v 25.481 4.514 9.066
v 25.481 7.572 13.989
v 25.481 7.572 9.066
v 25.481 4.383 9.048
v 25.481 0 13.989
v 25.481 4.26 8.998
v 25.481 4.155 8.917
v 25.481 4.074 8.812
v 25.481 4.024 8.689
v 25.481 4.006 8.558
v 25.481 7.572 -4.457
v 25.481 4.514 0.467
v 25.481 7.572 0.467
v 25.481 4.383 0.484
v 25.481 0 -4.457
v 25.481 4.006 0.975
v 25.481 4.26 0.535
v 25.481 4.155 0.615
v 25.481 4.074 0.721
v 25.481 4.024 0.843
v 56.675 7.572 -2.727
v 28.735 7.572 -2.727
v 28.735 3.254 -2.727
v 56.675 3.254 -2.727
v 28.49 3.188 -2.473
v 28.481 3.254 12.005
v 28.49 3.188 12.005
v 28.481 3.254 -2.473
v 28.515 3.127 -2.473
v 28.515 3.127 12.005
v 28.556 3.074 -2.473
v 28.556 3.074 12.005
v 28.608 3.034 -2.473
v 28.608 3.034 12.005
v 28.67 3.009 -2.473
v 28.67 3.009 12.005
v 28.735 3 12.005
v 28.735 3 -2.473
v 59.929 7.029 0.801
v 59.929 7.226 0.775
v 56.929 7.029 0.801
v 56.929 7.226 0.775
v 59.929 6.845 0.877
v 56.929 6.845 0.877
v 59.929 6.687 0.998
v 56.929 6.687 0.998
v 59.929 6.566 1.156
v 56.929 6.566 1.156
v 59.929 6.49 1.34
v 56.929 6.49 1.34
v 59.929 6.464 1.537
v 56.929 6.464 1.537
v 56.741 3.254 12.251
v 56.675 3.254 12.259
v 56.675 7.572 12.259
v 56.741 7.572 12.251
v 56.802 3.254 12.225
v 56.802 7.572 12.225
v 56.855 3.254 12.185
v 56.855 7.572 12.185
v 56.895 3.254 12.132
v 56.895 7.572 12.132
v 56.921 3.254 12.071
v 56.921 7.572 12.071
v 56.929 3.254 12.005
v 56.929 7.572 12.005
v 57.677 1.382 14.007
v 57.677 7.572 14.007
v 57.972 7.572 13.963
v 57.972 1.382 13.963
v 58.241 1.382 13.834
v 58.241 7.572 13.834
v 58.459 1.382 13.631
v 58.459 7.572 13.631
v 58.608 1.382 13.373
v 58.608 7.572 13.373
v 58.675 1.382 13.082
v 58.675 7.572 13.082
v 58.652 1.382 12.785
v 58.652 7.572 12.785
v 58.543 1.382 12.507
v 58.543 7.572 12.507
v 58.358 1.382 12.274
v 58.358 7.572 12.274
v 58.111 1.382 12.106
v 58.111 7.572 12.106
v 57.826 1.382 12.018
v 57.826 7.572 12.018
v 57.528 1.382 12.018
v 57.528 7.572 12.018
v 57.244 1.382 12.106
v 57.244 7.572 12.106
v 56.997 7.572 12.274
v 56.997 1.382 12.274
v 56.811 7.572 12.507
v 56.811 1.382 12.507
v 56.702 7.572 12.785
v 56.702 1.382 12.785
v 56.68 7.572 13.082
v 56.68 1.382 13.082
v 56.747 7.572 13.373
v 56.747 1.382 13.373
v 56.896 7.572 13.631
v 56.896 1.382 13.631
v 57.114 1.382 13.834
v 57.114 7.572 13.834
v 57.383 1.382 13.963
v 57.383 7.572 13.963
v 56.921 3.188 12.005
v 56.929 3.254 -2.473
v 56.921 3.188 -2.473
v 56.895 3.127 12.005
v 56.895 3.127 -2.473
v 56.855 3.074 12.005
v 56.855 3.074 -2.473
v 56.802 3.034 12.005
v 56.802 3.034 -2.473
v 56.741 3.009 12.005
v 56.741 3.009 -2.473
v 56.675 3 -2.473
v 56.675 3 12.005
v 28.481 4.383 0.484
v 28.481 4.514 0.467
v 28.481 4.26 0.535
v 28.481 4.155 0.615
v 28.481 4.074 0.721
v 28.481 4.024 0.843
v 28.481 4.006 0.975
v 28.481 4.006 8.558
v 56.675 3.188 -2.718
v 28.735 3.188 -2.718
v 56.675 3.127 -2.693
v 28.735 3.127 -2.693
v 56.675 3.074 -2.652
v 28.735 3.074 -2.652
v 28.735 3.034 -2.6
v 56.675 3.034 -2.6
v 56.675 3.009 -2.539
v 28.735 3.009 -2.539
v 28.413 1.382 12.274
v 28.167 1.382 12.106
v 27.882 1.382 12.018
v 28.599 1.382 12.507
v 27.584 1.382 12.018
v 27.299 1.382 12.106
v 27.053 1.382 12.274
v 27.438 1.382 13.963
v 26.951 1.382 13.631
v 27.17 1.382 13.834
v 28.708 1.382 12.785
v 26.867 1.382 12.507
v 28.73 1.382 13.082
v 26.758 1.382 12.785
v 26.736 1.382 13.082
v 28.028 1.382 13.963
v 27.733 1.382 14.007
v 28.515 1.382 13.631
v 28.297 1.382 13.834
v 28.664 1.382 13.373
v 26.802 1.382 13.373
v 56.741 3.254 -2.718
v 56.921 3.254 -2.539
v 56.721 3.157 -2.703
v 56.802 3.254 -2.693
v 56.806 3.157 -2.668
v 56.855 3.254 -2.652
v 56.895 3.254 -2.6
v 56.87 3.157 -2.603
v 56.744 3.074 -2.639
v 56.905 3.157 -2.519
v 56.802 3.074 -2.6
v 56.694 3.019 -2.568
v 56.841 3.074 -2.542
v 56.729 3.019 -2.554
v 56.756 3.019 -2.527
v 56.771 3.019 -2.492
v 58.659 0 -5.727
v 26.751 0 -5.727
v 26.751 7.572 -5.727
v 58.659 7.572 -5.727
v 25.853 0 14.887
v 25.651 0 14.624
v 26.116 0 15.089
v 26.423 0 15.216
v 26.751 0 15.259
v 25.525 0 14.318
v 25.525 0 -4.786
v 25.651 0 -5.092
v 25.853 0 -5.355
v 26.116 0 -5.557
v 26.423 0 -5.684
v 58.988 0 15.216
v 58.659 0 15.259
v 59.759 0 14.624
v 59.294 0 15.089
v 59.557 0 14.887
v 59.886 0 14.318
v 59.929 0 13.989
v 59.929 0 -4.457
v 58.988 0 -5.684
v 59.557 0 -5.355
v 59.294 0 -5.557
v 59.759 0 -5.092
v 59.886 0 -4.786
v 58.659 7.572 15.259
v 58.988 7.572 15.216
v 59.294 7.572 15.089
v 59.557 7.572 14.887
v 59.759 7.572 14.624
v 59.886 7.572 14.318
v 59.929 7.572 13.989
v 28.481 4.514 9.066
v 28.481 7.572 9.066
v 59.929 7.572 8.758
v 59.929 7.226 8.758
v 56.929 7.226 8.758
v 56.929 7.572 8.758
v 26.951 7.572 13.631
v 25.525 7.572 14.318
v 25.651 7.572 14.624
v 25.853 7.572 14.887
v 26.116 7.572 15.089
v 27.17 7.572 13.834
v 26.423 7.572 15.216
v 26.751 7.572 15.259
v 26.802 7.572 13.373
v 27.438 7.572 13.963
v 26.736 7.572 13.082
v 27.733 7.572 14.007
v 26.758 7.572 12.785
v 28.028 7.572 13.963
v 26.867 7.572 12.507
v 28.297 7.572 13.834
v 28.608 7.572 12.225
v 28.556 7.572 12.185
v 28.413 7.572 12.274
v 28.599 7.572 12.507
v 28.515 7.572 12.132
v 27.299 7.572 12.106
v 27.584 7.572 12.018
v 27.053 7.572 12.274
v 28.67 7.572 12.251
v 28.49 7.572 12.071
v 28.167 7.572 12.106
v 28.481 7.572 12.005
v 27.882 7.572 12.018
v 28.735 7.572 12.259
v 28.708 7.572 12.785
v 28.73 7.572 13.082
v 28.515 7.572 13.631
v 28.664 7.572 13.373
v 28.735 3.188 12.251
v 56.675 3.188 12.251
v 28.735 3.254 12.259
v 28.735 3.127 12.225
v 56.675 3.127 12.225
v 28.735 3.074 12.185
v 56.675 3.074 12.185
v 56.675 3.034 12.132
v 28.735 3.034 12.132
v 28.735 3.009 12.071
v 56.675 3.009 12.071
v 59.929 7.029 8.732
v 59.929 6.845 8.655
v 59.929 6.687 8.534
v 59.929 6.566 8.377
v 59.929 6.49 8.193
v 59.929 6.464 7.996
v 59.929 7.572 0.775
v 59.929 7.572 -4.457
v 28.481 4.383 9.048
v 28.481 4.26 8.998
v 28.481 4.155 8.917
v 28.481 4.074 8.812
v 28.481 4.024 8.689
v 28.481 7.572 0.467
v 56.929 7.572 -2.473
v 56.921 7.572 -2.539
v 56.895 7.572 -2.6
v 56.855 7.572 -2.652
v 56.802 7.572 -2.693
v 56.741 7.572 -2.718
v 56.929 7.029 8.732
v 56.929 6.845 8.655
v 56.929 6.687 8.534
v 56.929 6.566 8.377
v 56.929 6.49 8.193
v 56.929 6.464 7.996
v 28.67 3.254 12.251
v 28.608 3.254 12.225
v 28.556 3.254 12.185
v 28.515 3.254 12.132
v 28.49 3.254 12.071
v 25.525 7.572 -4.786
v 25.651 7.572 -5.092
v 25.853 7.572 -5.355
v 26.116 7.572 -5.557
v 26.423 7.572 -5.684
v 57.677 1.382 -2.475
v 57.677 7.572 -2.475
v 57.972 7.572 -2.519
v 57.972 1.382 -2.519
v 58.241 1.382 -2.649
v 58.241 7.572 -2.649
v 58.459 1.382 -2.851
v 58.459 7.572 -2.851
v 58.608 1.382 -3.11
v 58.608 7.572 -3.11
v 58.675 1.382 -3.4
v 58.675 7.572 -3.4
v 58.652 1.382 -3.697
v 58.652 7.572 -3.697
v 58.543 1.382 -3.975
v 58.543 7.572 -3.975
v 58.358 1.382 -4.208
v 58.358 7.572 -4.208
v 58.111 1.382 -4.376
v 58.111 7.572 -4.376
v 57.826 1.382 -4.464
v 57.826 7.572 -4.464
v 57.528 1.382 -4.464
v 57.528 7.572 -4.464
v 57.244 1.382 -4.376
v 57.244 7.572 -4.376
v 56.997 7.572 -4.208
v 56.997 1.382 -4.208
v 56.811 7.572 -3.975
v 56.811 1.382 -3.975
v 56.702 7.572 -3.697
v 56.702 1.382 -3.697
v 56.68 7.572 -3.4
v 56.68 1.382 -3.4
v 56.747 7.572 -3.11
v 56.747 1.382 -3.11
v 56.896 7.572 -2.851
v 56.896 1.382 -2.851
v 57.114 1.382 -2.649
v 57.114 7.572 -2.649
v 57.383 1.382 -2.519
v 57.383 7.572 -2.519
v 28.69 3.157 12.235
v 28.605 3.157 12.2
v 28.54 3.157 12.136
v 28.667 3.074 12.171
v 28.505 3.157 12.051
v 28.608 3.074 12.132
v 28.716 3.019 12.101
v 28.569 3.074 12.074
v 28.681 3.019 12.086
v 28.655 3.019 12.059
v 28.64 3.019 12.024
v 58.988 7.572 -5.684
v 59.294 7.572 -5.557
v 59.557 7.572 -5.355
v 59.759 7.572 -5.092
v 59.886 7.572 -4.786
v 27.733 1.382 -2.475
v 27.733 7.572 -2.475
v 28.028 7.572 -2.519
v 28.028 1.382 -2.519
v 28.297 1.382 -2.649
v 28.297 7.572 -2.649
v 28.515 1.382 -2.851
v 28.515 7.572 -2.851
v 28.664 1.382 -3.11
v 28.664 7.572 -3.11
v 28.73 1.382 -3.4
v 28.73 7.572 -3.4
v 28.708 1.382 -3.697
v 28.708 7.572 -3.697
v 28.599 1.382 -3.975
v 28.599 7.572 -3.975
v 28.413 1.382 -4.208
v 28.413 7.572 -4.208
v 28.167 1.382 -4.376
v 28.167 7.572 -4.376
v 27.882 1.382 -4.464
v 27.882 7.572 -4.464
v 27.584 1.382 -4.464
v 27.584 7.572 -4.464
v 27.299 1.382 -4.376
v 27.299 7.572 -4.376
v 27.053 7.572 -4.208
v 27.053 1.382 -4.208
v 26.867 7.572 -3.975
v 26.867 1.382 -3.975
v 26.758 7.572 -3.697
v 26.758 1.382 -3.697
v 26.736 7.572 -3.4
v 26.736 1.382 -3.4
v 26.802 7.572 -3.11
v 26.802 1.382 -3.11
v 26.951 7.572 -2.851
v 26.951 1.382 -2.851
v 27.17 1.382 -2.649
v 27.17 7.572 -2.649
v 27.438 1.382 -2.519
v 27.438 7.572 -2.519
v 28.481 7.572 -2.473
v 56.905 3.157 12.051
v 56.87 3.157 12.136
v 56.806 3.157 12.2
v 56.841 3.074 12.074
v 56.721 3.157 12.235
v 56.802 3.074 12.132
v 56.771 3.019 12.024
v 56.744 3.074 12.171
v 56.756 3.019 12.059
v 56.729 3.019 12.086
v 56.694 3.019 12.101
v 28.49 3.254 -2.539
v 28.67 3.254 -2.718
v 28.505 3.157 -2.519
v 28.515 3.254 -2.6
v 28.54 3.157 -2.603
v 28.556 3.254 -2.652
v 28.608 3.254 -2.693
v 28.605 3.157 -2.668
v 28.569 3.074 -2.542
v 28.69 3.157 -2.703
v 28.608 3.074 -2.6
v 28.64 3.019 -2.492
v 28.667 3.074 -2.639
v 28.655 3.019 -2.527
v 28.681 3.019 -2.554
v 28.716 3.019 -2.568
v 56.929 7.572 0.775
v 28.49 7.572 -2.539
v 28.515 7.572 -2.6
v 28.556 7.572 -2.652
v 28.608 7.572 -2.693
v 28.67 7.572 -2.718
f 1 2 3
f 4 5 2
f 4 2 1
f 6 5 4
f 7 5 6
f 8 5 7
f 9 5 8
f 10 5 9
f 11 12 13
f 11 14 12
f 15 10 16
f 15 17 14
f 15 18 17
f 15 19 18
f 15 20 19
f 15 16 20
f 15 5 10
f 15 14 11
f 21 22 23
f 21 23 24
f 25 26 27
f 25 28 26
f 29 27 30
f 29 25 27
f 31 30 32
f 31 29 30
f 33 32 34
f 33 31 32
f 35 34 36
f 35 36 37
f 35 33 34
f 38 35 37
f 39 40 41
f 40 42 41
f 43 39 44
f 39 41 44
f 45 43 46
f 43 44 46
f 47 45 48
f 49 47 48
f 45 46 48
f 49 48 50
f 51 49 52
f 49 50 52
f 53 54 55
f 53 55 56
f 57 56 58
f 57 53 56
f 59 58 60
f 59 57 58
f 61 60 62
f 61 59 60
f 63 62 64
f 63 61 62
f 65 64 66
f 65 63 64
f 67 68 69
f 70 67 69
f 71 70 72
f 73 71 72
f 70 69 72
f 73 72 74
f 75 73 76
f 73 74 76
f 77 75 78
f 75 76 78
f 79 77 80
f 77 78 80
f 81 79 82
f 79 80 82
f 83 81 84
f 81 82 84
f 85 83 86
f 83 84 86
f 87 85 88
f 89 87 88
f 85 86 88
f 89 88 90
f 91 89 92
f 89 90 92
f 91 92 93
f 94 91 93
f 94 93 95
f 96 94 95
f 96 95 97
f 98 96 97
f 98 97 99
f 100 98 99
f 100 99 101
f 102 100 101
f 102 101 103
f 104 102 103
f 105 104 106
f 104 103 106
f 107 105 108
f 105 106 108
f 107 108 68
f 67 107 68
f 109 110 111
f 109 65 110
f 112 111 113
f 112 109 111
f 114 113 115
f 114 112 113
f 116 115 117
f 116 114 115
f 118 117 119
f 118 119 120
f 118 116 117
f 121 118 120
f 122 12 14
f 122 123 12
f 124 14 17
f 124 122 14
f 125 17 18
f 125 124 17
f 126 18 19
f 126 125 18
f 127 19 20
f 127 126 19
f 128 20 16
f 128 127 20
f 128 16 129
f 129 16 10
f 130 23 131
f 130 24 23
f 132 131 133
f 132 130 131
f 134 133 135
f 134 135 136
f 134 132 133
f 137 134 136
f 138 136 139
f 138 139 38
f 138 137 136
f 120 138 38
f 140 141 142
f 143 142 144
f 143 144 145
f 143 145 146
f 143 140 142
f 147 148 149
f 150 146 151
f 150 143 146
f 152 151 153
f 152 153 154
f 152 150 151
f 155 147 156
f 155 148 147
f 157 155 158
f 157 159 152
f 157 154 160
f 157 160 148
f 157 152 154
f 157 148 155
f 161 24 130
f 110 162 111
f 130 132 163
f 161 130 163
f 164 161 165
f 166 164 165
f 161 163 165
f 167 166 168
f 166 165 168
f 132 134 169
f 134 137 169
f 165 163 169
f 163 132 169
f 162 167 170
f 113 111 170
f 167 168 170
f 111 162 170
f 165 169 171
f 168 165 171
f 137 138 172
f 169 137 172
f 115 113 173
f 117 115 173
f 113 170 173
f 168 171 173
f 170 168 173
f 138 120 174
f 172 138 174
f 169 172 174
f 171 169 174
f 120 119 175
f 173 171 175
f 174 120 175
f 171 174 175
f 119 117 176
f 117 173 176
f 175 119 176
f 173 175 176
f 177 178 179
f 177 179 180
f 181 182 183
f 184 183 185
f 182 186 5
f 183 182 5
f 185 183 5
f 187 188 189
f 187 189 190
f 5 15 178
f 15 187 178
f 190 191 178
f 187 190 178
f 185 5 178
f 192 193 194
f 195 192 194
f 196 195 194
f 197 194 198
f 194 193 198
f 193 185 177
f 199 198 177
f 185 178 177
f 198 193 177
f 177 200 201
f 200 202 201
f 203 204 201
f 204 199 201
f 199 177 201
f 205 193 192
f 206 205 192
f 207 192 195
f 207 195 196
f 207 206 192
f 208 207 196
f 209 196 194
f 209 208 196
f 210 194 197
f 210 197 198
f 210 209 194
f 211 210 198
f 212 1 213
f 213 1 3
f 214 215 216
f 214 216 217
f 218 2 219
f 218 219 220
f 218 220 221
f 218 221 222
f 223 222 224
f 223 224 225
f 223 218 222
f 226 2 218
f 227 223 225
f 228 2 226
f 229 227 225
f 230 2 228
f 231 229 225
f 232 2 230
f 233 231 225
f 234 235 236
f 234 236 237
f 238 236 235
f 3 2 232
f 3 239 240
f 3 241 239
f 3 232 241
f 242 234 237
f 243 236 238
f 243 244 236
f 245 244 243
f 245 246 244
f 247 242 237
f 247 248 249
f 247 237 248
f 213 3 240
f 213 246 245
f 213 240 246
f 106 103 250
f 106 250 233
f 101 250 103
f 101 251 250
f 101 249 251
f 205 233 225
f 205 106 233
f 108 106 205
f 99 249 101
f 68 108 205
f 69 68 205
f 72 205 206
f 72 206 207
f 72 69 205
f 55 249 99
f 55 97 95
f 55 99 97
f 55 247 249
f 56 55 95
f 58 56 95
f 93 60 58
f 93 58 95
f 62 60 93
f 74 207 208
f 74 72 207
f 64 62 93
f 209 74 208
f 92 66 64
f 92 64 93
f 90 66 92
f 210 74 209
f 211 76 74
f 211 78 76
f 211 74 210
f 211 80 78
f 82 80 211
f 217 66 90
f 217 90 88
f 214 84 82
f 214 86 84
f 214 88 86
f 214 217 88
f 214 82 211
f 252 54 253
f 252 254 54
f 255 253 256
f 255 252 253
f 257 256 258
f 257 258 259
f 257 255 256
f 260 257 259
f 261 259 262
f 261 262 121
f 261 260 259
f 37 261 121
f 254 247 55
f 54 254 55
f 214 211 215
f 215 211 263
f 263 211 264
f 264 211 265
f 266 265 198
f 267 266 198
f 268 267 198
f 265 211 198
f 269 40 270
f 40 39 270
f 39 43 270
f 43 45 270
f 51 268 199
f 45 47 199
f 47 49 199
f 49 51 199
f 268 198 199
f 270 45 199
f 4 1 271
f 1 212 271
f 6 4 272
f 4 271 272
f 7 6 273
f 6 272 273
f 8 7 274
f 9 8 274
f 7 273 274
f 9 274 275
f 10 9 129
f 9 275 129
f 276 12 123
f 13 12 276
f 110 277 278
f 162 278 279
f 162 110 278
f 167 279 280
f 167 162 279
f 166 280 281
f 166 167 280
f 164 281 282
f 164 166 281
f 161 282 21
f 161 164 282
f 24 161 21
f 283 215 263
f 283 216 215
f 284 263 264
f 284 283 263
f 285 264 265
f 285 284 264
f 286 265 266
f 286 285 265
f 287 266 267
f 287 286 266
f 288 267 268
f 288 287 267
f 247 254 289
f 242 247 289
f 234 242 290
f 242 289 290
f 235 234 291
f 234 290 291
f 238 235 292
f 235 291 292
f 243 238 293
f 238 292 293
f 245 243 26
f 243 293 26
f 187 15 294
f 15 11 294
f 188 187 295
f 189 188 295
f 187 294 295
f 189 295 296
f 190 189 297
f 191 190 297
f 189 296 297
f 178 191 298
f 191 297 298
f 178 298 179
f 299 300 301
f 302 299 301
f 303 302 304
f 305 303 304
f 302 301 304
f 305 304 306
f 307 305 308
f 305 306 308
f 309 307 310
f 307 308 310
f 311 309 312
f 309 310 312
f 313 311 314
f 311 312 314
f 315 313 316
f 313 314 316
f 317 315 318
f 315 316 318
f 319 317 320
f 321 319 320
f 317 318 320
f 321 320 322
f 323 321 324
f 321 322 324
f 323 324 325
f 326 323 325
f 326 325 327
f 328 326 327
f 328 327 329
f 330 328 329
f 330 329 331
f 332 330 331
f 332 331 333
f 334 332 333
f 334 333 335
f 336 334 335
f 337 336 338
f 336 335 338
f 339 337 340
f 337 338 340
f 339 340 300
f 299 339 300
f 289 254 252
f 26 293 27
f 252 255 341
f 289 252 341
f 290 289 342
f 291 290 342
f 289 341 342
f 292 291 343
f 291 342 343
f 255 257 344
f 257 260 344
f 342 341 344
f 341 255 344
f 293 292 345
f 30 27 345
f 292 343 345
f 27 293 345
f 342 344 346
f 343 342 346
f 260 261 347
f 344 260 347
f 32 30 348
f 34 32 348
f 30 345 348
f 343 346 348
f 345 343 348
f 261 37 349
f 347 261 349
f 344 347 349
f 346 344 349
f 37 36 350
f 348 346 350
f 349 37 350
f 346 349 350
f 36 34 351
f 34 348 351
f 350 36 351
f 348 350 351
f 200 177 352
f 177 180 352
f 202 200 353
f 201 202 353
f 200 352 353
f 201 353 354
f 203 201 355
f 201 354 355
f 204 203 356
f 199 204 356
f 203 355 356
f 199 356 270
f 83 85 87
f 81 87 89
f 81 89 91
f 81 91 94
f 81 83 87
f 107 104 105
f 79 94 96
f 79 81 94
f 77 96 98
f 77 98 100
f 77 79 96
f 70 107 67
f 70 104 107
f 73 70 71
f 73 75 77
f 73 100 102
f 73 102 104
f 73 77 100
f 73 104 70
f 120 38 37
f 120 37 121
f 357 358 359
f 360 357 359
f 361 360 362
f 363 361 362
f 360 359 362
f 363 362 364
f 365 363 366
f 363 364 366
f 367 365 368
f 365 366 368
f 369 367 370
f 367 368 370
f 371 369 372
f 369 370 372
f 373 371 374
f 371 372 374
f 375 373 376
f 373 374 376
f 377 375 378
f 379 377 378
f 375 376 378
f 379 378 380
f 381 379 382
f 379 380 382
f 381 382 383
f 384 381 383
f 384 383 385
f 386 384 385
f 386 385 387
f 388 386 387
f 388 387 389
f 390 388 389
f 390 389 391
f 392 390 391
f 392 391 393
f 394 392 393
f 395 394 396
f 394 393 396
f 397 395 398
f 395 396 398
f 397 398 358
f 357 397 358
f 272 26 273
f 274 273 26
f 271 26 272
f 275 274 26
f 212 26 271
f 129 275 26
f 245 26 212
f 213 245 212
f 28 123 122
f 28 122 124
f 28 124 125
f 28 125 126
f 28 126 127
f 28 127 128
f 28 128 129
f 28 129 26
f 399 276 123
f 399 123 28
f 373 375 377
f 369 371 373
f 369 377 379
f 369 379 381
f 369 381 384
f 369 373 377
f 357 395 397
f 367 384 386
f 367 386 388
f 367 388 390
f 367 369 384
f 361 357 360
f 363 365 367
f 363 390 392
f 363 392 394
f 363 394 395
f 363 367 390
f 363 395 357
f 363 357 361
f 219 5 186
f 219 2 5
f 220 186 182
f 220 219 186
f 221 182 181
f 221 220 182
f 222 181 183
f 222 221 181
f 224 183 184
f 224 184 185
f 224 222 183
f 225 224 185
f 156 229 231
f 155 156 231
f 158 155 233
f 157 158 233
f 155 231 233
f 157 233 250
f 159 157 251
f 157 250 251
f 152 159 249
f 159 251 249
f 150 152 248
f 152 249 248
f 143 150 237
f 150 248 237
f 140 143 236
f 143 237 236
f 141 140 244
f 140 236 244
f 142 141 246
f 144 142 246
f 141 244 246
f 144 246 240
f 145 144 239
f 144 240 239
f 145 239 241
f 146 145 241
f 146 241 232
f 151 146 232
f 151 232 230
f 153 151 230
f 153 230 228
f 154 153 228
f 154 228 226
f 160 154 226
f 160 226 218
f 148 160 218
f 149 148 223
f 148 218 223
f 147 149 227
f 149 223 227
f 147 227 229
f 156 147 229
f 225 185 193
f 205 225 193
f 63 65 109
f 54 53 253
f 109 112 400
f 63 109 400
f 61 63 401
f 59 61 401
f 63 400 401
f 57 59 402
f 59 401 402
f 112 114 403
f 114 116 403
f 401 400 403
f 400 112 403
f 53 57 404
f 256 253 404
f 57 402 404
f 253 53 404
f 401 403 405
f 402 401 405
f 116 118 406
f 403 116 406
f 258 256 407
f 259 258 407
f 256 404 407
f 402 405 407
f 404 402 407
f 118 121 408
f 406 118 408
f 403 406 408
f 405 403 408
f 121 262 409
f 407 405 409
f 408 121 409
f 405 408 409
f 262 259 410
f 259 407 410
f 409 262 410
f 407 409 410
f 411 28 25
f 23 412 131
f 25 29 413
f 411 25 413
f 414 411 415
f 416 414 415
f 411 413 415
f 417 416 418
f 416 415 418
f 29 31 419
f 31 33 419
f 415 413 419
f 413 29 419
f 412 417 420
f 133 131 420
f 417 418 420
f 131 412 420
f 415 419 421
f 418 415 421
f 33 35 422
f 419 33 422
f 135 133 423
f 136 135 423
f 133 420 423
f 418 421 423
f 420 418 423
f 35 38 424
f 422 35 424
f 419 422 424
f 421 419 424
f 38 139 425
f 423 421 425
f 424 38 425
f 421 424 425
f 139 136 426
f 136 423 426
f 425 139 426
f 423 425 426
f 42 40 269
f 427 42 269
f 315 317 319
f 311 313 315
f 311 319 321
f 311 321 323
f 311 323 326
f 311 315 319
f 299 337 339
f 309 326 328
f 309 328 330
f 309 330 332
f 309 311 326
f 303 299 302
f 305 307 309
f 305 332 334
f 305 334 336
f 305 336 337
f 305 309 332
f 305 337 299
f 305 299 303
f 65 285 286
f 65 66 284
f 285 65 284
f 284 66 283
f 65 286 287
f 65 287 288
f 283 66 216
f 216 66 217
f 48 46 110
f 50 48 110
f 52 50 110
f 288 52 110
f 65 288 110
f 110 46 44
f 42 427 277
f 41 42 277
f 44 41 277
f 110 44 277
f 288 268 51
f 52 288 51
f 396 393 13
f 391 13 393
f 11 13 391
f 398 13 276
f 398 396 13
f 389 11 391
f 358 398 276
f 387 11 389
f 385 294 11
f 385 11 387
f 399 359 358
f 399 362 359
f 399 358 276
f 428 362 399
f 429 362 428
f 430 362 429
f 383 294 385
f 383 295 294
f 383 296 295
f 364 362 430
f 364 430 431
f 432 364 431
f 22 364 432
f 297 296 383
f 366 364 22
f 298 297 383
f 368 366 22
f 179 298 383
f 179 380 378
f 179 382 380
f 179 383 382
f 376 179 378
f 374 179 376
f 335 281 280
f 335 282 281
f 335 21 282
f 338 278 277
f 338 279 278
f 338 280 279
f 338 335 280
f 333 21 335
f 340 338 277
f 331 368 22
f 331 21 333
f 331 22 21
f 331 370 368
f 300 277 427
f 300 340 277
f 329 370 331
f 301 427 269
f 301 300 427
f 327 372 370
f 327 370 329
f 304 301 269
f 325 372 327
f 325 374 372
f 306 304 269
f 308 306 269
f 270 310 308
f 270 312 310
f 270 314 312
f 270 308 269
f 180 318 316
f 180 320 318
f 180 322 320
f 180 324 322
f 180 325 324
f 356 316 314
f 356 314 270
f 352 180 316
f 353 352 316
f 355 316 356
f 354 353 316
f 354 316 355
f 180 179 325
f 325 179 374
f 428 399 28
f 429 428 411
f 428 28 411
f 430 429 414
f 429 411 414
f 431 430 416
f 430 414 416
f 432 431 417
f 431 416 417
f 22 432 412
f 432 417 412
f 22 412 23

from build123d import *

# Parameters (mm, degrees)
SKETCH1_W           = 34.447999938
SKETCH1_H           = 20.985999938
BOSS_EXTRUDE1_DEPTH = 7.572
SKETCH3_W           = 28.448
SKETCH3_H           = 14.986
CUT_EXTRUDE1_DEPTH  = 4.572
SKETCH4_R           = 1
CUT_EXTRUDE2_DEPTH  = 6.19
FILLET1_R           = 1.27
FILLET2_R           = 0.254
FILLET3_R           = 0.254
SKETCH5_W           = 8.599089175
SKETCH5_H           = 3.565628699
CUT_EXTRUDE3_DEPTH  = 2.999999969
FILLET4_R           = 0.508
SKETCH7_W           = 7.982788435
SKETCH7_H           = 1.108191991
CUT_EXTRUDE4_DEPTH  = 2.999999969
FILLET5_R           = 0.762


with BuildPart() as part:
    # Sketch1 → Boss-Extrude1 (new body)
    with BuildSketch(Plane(origin=(0, 0, 0), x_dir=(1, 0, 0), z_dir=(0, 1, 0))):
        with Locations((42.705323942, -4.766172171)):
            Rectangle(SKETCH1_W, SKETCH1_H)
    extrude(amount=BOSS_EXTRUDE1_DEPTH)

    # Sketch3 → Cut-Extrude1 (cut)
    with BuildSketch(Plane(origin=(0, 7.572, 0), x_dir=(1, 0, 0), z_dir=(0, 1, 0))):
        with Locations((42.705323942, -4.766172171)):
            Rectangle(SKETCH3_W, SKETCH3_H)
    extrude(amount=-CUT_EXTRUDE1_DEPTH, mode=Mode.SUBTRACT)

    # Sketch4 → Cut-Extrude2 (cut)
    with BuildSketch(Plane(origin=(0, 7.572, 0), x_dir=(1, 0, 0), z_dir=(0, 1, 0))):
        with Locations(Location((57.677427469, 3.474931356, 0), (0, 0, 270))):
            Circle(SKETCH4_R)
        with Locations(Location((57.677427469, -13.007275697, 0), (0, 0, 270))):
            Circle(SKETCH4_R)
        with Locations(Location((27.733220415, -13.007275697, 0), (0, 0, 270))):
            Circle(SKETCH4_R)
        with Locations(Location((27.733220415, 3.474931356, 0), (0, 0, 270))):
            Circle(SKETCH4_R)
    extrude(amount=-CUT_EXTRUDE2_DEPTH, mode=Mode.SUBTRACT)

    # Fillet1
    fillet1_edges = [part.edges().sort_by_distance(p)[0] for p in [
        (25.481323973, 3.786, -5.726827798),
        (59.929323911, 3.786, -5.726827798),
        (59.929323911, 3.786, 15.25917214),
        (25.481323973, 3.786, 15.25917214),
    ]]
    fillet(fillet1_edges, radius=FILLET1_R)

    # Fillet2
    fillet2_edges = [part.edges().sort_by_distance(p)[0] for p in [
        (28.481323942, 5.286, 12.259172171),
        (28.481323942, 5.286, -2.726827829),
        (56.929323942, 5.286, -2.726827829),
        (56.929323942, 5.286, 12.259172171),
    ]]
    fillet(fillet2_edges, radius=FILLET2_R)

    # Fillet3
    fillet3_edges = [part.edges().sort_by_distance(p)[0] for p in [
        (42.705323942, 3, -2.726827829),
        (56.929323942, 3, 4.766172171),
        (28.481323942, 3, 4.766172171),
        (42.705323942, 3, 12.259172171),
        (28.555718819, 3, -2.652432952),
        (28.555718819, 3, 12.184777293),
        (56.854929064, 3, 12.184777293),
        (56.854929064, 3, -2.652432952),
    ]]
    fillet(fillet3_edges, radius=FILLET3_R)

    # Sketch5 → Cut-Extrude3 (cut)
    with BuildSketch(Plane.ZY.offset(-25.481323973)):
        with Locations((4.76617217, 5.789185651)):
            Rectangle(SKETCH5_W, SKETCH5_H)
    extrude(amount=-CUT_EXTRUDE3_DEPTH, mode=Mode.SUBTRACT)

    # Fillet4
    fillet4_edges = [part.edges().sort_by_distance(p)[0] for p in [
        (26.981323957, 4.006371301, 9.065716758),
        (26.981323957, 4.006371301, 0.466627583),
    ]]
    fillet(fillet4_edges, radius=FILLET4_R)

    # Sketch7 → Cut-Extrude4 (cut)
    with BuildSketch(Plane(origin=(59.929323911, 0, 0), x_dir=(0, 0, -1), z_dir=(1, 0, 0))):
        with Locations((-4.766172171, 7.017904005)):
            Rectangle(SKETCH7_W, SKETCH7_H)
    extrude(amount=-CUT_EXTRUDE4_DEPTH, mode=Mode.SUBTRACT)

    # Fillet5
    fillet5_edges = [part.edges().sort_by_distance(p)[0] for p in [
        (58.429323926, 6.463808009, 0.774777953),
        (58.429323926, 6.463808009, 8.757566388),
    ]]
    fillet(fillet5_edges, radius=FILLET5_R)


solid = part.part
